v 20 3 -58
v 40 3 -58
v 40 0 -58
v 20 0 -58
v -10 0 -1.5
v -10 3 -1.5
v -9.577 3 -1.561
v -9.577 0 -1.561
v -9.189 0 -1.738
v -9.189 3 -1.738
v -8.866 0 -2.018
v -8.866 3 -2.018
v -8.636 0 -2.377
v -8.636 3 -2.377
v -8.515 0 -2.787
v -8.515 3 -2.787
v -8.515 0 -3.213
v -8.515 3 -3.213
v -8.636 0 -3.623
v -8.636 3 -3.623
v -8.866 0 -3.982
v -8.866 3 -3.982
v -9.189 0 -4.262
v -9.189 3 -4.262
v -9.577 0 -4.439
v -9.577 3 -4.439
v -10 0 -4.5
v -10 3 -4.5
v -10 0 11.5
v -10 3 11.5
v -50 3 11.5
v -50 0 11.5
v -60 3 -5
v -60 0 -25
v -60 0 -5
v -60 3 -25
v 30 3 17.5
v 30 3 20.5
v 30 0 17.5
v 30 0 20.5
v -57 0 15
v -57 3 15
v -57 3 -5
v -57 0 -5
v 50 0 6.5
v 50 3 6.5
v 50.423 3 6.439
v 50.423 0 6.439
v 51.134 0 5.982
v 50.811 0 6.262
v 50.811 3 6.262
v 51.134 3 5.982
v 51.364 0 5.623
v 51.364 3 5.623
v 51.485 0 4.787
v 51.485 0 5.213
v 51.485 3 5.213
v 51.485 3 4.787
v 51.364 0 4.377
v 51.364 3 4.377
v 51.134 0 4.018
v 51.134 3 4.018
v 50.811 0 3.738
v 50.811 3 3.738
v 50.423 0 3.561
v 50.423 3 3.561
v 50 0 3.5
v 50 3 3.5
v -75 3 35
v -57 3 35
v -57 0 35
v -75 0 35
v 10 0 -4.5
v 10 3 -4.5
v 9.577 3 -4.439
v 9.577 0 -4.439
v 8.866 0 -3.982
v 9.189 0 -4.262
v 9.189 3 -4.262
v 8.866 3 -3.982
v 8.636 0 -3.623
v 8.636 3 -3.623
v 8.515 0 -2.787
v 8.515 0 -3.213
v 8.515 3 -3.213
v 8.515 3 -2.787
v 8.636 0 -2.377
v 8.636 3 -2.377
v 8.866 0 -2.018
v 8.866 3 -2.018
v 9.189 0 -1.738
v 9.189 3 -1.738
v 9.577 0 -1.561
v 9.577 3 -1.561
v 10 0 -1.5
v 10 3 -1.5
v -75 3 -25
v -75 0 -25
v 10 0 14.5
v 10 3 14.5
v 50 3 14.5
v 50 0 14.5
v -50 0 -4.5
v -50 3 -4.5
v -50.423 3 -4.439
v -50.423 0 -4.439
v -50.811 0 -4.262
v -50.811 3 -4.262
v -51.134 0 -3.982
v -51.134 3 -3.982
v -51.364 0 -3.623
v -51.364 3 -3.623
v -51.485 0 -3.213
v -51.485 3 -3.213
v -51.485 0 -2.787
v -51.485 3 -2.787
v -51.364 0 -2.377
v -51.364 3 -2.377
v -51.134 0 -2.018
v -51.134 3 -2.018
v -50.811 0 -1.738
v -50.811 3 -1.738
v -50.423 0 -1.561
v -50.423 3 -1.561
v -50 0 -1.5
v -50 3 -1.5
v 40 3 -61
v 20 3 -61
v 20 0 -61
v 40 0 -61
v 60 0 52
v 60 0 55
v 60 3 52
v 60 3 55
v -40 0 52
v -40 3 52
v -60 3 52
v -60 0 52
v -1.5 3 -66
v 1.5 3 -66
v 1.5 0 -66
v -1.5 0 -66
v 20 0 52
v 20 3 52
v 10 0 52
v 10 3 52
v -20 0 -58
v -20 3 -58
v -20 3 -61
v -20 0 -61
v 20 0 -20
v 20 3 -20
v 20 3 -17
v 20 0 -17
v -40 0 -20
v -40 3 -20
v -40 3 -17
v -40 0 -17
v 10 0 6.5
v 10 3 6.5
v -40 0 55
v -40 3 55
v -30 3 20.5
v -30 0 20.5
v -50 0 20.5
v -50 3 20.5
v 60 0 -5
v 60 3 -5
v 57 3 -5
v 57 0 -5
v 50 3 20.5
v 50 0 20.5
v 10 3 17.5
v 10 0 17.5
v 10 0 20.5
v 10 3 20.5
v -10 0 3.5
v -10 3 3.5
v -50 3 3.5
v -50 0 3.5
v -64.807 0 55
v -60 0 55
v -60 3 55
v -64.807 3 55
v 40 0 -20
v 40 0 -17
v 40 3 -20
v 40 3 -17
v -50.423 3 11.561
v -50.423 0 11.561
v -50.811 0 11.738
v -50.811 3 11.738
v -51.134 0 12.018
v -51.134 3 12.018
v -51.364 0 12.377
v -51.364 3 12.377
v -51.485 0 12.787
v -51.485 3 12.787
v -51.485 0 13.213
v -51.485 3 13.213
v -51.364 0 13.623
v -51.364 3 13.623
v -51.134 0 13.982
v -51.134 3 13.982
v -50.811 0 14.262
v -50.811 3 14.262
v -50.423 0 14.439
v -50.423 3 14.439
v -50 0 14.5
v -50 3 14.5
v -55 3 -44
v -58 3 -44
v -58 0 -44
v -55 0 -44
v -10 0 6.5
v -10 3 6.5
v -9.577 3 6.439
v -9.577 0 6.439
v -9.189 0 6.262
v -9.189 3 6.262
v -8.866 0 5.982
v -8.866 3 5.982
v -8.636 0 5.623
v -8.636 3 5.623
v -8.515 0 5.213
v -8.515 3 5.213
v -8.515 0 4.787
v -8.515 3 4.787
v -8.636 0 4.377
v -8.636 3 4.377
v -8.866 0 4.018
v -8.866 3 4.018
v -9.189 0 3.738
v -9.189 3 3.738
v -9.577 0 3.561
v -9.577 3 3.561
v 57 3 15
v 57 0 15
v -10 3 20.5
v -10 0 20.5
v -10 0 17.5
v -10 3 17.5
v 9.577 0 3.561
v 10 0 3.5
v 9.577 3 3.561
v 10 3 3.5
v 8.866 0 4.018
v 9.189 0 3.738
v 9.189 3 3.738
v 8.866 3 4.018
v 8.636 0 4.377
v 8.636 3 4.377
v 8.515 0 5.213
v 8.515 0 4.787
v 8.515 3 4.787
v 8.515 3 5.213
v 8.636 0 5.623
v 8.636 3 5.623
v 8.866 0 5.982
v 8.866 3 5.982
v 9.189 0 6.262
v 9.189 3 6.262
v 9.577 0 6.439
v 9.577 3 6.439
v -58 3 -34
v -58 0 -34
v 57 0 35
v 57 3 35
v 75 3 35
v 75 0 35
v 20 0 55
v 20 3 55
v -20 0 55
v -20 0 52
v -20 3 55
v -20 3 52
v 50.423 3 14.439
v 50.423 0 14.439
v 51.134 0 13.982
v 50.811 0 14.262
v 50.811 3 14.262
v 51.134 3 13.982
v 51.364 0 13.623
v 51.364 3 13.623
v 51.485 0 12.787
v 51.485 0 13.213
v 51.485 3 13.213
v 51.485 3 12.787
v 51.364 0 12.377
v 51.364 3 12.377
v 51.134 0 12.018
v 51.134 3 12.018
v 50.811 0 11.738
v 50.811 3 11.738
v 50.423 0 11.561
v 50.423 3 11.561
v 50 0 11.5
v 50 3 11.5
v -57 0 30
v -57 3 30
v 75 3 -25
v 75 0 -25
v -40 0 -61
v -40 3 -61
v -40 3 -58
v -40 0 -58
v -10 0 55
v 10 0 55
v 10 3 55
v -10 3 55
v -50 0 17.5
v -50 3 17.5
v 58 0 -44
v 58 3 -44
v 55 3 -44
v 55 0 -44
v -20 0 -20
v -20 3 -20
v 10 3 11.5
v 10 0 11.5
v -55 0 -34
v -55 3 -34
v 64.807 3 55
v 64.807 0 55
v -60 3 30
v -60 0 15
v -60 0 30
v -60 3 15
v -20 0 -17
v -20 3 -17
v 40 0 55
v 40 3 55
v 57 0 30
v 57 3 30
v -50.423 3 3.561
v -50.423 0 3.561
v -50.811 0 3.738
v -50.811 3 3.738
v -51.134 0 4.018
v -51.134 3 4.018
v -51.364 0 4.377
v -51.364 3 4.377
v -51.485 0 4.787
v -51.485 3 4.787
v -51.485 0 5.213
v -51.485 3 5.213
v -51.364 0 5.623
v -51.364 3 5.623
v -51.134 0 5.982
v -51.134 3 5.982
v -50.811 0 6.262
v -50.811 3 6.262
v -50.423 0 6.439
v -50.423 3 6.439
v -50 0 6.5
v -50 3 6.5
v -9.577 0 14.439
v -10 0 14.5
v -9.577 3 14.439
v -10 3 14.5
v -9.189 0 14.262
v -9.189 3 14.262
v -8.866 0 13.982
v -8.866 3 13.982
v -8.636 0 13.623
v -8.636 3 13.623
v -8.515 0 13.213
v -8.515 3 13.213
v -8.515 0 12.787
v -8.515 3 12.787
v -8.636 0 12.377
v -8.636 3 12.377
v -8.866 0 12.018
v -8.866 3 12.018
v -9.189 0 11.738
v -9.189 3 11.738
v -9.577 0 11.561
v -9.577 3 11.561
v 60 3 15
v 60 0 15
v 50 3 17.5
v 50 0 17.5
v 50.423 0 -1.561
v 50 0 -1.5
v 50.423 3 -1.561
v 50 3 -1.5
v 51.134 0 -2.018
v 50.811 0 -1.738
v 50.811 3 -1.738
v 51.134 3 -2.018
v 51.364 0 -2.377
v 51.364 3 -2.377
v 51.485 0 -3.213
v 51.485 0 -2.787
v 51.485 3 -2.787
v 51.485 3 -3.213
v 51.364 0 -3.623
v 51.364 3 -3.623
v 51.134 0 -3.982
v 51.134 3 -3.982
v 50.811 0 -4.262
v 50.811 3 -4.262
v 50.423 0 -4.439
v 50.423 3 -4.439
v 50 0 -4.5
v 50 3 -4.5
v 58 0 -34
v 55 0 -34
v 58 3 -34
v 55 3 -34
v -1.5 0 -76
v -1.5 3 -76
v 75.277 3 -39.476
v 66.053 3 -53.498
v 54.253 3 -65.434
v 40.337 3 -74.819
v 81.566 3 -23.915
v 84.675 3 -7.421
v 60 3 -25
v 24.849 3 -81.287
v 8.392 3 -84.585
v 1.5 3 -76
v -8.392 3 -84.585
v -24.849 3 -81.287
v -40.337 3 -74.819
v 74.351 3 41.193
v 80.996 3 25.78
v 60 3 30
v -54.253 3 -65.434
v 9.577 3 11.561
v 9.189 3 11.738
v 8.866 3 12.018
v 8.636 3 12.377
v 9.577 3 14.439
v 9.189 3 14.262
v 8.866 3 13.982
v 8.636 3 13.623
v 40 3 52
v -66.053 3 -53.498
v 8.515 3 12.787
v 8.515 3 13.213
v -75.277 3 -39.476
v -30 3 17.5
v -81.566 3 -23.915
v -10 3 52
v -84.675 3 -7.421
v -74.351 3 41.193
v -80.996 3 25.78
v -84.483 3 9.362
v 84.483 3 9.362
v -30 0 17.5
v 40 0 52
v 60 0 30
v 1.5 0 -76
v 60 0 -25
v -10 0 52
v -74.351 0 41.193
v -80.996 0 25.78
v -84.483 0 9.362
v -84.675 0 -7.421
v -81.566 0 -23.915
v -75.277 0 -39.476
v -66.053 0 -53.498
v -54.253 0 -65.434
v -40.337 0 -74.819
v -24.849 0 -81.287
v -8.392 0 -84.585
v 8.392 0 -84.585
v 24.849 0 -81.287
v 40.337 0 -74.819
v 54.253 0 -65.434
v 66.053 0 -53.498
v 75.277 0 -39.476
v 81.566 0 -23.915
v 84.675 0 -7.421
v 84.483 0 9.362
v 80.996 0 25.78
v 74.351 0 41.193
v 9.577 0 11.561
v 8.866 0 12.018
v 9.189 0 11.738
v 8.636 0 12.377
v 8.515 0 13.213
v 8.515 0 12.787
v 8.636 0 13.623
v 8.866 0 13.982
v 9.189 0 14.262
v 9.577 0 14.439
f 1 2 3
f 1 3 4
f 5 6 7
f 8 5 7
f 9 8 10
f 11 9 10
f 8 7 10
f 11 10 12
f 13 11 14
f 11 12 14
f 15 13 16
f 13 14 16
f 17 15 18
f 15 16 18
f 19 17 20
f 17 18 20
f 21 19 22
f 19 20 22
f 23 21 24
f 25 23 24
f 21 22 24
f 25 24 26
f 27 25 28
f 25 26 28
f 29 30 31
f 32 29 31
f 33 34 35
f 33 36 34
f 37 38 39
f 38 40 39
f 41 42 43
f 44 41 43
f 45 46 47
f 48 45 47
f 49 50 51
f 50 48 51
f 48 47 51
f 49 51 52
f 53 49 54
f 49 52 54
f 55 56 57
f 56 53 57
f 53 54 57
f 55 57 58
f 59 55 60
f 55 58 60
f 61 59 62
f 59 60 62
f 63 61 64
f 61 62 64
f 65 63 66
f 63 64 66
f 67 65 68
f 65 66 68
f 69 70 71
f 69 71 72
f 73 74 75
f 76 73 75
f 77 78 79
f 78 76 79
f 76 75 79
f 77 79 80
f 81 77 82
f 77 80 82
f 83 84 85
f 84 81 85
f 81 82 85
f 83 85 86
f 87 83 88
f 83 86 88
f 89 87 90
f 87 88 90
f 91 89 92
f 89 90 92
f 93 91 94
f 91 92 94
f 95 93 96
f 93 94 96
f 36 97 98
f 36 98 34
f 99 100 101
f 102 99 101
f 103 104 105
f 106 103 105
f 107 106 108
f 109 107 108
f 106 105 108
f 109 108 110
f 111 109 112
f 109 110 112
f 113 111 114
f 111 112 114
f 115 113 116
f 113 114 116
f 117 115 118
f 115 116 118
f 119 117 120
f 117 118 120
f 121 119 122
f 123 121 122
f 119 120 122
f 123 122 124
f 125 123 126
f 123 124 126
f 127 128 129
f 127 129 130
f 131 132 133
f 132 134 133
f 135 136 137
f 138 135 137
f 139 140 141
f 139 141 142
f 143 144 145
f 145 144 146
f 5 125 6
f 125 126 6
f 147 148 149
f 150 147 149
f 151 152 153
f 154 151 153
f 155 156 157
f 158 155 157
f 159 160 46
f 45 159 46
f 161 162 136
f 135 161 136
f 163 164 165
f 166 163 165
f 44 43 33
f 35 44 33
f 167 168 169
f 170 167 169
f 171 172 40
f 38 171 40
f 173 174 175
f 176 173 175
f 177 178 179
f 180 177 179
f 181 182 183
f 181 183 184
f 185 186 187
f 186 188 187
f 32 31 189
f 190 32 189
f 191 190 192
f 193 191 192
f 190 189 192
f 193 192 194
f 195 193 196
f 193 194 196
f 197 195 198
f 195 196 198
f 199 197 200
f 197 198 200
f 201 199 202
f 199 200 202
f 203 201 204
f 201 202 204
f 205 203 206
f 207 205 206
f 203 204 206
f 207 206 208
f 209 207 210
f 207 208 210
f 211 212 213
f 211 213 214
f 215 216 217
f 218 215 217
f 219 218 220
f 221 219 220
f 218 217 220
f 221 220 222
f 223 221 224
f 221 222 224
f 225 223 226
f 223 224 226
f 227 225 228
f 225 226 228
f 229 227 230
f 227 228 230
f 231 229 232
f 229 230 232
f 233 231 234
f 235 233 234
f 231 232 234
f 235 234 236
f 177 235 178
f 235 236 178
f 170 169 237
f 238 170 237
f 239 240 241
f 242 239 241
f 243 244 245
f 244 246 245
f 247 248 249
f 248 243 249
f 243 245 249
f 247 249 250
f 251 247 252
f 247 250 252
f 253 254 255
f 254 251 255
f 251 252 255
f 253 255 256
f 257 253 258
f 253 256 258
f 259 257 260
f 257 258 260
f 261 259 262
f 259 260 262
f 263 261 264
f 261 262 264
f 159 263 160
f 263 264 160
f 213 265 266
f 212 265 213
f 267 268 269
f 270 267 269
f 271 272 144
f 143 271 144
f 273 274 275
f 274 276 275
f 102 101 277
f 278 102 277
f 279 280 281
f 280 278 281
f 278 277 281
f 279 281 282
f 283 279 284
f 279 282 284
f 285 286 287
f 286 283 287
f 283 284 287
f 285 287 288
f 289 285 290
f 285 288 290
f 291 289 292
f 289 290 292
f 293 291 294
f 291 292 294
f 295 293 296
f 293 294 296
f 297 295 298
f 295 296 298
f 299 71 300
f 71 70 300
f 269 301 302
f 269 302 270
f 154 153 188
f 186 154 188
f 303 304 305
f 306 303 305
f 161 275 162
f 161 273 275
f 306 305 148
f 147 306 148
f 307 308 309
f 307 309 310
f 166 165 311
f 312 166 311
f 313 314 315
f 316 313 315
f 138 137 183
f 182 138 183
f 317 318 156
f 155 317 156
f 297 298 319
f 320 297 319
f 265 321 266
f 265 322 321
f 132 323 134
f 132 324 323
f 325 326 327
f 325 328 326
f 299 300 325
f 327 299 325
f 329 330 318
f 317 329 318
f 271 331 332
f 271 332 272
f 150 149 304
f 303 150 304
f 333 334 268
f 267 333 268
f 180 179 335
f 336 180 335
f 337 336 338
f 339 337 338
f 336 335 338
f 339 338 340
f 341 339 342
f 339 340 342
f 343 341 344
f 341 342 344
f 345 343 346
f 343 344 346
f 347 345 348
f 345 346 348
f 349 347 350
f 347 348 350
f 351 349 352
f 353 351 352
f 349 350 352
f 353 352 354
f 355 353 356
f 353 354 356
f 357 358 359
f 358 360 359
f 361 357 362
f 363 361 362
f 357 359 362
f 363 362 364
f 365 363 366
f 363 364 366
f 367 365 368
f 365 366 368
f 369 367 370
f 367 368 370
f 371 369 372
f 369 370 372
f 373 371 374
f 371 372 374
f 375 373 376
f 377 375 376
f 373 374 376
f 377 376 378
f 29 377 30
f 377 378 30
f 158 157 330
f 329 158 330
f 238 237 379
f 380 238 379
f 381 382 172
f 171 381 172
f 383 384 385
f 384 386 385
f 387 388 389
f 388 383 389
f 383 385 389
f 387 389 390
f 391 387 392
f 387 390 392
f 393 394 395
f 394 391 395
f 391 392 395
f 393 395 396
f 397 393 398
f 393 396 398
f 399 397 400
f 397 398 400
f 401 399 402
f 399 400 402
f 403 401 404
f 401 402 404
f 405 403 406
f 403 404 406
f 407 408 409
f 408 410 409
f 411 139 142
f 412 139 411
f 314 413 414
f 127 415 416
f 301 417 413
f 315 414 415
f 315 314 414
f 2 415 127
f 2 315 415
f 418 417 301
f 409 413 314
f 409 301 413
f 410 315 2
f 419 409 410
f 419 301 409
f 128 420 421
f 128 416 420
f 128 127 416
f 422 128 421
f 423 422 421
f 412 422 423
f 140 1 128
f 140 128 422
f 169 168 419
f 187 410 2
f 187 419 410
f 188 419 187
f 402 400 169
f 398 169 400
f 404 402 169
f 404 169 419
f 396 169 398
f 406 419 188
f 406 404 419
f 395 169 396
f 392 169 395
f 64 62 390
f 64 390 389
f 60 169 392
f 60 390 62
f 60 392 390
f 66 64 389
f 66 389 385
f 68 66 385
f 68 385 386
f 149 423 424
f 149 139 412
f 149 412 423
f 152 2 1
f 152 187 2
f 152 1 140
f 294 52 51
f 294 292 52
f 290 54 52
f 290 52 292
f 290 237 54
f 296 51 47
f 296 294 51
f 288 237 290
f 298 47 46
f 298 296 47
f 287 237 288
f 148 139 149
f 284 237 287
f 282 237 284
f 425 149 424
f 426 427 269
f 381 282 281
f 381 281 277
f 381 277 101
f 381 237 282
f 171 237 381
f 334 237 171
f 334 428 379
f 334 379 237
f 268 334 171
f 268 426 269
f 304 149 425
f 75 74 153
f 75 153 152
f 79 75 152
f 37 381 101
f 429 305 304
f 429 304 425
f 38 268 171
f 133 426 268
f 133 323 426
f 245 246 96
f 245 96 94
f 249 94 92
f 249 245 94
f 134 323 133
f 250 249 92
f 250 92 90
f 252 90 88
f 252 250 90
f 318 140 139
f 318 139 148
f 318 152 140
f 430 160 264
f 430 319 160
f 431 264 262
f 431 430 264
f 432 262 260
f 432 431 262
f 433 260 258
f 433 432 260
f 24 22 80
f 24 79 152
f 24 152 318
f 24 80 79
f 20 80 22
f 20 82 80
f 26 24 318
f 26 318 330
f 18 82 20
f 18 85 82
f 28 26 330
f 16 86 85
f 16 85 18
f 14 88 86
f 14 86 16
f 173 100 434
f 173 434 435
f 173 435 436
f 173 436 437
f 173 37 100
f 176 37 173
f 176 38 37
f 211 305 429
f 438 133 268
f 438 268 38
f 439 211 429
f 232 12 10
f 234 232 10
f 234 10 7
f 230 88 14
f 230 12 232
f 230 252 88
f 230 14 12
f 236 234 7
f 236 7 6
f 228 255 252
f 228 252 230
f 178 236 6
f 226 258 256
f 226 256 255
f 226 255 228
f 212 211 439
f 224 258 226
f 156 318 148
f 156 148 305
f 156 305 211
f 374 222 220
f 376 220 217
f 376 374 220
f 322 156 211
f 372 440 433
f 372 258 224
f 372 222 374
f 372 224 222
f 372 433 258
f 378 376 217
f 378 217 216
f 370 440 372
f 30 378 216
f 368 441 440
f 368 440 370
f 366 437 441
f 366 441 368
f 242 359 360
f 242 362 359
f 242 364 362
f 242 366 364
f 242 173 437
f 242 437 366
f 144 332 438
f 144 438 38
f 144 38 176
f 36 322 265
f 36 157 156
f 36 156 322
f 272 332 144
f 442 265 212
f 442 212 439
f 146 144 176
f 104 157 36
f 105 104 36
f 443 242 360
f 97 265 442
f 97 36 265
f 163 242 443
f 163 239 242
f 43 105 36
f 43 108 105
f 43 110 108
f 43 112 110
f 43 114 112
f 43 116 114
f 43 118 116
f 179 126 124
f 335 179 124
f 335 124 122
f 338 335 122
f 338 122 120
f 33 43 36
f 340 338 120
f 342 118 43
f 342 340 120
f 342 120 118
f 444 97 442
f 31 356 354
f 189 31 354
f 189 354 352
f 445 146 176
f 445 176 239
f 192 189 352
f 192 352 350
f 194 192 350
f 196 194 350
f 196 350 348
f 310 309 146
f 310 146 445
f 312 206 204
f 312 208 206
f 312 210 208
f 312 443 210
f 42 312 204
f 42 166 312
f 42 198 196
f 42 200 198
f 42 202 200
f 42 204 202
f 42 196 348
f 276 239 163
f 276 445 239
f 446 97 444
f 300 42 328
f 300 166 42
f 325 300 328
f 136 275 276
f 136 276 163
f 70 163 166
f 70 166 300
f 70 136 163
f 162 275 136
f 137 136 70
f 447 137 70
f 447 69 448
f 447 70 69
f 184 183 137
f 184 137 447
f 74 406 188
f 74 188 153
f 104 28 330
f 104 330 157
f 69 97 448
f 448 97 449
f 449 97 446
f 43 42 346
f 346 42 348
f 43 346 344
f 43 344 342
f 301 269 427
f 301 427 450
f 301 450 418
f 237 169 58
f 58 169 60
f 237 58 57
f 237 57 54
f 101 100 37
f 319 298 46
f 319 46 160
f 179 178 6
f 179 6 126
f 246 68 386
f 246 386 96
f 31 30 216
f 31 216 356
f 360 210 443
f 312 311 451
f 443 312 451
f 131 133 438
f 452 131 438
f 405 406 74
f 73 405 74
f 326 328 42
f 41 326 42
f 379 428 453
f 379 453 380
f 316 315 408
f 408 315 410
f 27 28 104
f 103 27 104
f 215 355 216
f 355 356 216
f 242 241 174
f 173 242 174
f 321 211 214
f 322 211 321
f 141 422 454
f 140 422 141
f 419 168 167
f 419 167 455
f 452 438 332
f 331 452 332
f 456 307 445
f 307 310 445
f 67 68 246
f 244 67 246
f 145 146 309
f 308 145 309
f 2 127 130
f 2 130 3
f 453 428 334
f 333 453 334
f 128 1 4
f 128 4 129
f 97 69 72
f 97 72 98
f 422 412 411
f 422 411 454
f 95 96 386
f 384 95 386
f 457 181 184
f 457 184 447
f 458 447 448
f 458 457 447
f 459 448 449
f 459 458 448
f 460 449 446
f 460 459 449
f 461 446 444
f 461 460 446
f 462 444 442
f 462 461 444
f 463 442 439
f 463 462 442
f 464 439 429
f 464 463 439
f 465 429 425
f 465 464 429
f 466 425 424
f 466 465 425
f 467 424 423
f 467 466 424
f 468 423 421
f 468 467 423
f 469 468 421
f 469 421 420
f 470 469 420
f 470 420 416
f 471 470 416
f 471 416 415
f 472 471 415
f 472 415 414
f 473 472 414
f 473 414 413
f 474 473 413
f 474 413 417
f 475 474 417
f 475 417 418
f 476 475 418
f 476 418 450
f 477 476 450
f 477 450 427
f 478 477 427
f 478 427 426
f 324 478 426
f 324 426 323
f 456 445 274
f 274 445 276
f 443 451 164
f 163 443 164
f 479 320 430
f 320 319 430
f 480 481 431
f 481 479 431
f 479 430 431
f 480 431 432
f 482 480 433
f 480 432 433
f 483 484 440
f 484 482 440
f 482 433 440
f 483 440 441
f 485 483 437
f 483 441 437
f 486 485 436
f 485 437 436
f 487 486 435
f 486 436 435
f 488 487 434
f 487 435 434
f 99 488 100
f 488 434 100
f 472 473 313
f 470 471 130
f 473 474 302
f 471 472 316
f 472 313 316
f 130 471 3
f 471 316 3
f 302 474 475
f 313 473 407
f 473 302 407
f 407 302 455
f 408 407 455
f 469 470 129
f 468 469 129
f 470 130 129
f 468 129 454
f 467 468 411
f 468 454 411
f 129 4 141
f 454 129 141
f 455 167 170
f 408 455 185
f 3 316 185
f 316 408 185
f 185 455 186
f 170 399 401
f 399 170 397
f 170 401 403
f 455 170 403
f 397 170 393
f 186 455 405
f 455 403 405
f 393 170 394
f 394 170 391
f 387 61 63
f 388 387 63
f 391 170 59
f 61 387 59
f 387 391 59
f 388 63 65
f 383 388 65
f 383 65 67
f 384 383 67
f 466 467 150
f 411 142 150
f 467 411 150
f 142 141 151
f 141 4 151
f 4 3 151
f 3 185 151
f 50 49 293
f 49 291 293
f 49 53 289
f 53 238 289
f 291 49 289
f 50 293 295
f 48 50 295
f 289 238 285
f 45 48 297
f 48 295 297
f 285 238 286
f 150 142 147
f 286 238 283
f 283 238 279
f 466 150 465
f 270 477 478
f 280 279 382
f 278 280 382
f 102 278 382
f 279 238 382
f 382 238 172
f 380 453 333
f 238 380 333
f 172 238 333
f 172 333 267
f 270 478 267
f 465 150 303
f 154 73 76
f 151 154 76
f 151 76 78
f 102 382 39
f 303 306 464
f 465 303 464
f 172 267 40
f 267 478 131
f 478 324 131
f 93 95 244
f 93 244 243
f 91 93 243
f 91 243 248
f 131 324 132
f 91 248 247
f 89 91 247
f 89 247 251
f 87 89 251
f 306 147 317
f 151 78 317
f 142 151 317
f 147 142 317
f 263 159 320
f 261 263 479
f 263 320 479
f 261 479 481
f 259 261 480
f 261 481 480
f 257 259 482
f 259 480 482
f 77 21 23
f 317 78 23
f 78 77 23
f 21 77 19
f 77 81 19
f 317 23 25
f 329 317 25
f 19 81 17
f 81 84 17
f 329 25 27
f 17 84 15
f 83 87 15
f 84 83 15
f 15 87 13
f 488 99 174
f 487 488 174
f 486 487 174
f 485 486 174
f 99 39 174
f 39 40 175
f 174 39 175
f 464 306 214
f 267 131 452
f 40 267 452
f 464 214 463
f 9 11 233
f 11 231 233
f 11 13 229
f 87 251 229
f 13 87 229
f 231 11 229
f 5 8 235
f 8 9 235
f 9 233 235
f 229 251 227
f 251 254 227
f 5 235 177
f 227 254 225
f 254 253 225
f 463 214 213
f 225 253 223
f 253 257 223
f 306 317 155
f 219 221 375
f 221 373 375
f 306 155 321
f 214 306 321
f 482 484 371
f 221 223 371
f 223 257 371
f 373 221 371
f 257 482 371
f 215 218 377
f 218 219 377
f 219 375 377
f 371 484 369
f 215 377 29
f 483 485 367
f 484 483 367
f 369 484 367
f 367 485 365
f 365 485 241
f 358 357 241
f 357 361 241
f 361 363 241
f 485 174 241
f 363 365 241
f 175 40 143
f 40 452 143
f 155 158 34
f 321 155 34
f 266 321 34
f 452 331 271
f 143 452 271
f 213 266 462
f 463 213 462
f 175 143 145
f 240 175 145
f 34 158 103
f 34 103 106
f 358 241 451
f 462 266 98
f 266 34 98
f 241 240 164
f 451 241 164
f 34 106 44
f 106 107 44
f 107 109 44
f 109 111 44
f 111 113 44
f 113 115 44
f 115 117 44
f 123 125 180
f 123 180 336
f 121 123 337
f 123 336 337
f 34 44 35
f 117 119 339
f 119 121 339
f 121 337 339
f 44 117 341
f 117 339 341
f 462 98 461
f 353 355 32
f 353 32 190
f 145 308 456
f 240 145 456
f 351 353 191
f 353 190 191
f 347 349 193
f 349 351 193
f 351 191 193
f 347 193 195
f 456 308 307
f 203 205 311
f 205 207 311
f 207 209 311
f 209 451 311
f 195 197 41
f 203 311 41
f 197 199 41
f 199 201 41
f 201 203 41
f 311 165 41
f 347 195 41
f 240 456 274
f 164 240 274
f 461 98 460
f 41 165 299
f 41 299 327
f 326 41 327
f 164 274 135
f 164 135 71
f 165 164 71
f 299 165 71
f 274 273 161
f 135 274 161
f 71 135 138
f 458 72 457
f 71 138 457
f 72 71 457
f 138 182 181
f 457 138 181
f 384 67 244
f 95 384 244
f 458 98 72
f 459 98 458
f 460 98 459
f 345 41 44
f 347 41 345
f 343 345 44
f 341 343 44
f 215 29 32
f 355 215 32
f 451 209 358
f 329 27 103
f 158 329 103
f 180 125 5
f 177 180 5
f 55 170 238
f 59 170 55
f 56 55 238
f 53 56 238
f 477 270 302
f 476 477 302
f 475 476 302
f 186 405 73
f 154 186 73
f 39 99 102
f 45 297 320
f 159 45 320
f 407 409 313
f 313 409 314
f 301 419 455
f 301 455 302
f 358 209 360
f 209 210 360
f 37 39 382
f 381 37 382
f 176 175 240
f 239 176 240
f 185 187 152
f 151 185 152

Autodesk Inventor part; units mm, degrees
ref_plane "YZ Plane" through (0, 0, 0) normal (1, 0, 0) x (0, 1, 0)
ref_plane "XZ Plane" through (0, 0, 0) normal (0, 1, 0) x (-1, 0, 0)
ref_plane "XY Plane" through (0, 0, 0) normal (0, 0, 1) x (1, 0, 0)
sketch "Sketch1" plane through (0, 0, 0) normal (0, 1, 0) x (-1, 0, 0)
  circle A0 centre (0, 0) radius 85
  line L0 (-64.8074, 55) -> (64.8074, 55)
  dimension "d0" = 170
  dimension "d1" = 55
extrude "Extrusion1" add sketch "Sketch1" along normal blind 3 contours A0 L0 picked at (-1.5877, 8.3779)
sketch "Sketch2" plane through (0, 3, 0) normal (0, 1, 0) x (1, 0, 0)
  line L0 (-75, 25) -> (-60, 25)
  line L1 (-60, 25) -> (-60, -35)
  line L2 (-60, -35) -> (-75, -35)
  line L3 (-75, -35) -> (-75, 25)
  line L4 (-75, -5) -> (-60, -5) construction
  point P0 (0, 0)
  dimension "d4" = 15
  dimension "d5" = 60
  dimension "d6" = 60
  dimension "d7" = 5
extrude "Extrusion2" cut sketch "Sketch2" against normal blind 3
sketch "Sketch3" plane through (0, 3, 0) normal (0, 1, 0) x (1, 0, 0)
  line L0 (-60, -35) -> (-60, 25) projected
  line L1 (-60, -15) -> (-57, -15)
  line L2 (-57, -15) -> (-57, 5)
  line L3 (-57, 5) -> (-60, 5)
  line L4 (-60, 5) -> (-60, -15)
  line L5 (-60, -35) -> (-57, -35)
  line L6 (-57, -35) -> (-57, -30)
  line L7 (-57, -30) -> (-60, -30)
  line L8 (-60, -30) -> (-60, -35)
  point P0 (0, 0)
  point P1 (-57, -5)
  point P2 (-60, -5)
  dimension "d10" = 3
  dimension "d11" = 20
  dimension "d12" = 3
  dimension "d13" = 5
  dimension "d14" = 15
extrude "Extrusion3" cut sketch "Sketch3" against normal blind 3
sketch "Sketch8" plane through (0, 3, 0) normal (0, 1, 0) x (1, 0, 0)
  line L0 (-10, -13) -> (-50, -13) construction
  line L1 (-10, -11.5) -> (-50, -11.5)
  line L2 (-50, -14.5) -> (-10, -14.5)
  arc A0 (-10, -14.5) -> (-10, -11.5) centre (-10, -13) ccw
  arc A1 (-50, -11.5) -> (-50, -14.5) centre (-50, -13) ccw
  line L3 (-10, -5) -> (-50, -5) construction
  line L4 (-10, -3.5) -> (-50, -3.5)
  line L5 (-50, -6.5) -> (-10, -6.5)
  arc A2 (-10, -6.5) -> (-10, -3.5) centre (-10, -5) ccw
  arc A3 (-50, -3.5) -> (-50, -6.5) centre (-50, -5) ccw
  line L6 (-10, 3) -> (-50, 3) construction
  line L7 (-10, 4.5) -> (-50, 4.5)
  line L8 (-50, 1.5) -> (-10, 1.5)
  arc A4 (-10, 1.5) -> (-10, 4.5) centre (-10, 3) ccw
  arc A5 (-50, 4.5) -> (-50, 1.5) centre (-50, 3) ccw
  point P0 (0, 0)
  point P1 (-30, -13)
  point P2 (-30, -5)
  point P3 (-30, 3)
  dimension "d54" = 3
  dimension "d55" = 3
  dimension "d56" = 3
  dimension "d57" = 5
  dimension "d58" = 5
  dimension "d59" = 5
  dimension "d60" = 40
  dimension "d61" = 30
extrude "Extrusion7" cut sketch "Sketch8" against normal blind 3
sketch "Sketch4" plane through (0, 3, 0) normal (0, 1, 0) x (1, 0, 0)
  line L0 (-60, -55) -> (-40, -55)
  line L1 (-40, -55) -> (-40, -52)
  line L2 (-40, -52) -> (-60, -52)
  line L3 (-60, -52) -> (-60, -55)
  line L4 (-64.8074, -55) -> (64.8074, -55) projected
  line L5 (-20, -55) -> (-10, -55)
  line L6 (-10, -55) -> (-10, -52)
  line L7 (-10, -52) -> (-20, -52)
  line L8 (-20, -52) -> (-20, -55)
  point P0 (0, 0)
  dimension "d17" = 20
  dimension "d18" = 3
  dimension "d19" = 10
  dimension "d20" = 3
  dimension "d21" = 10
  dimension "d22" = 20
extrude "Extrusion4" cut sketch "Sketch4" against normal blind 3
sketch "Sketch5" plane through (0, 0, 0) normal (0, -1, 0) x (1, 0, 0)
  line L0 (-50, 17.5) -> (-30, 17.5)
  line L1 (-30, 17.5) -> (-30, 20.5)
  line L2 (-30, 20.5) -> (-50, 20.5)
  line L3 (-50, 20.5) -> (-50, 17.5)
  line L4 (-10, 17.5) -> (10, 17.5)
  line L5 (10, 17.5) -> (10, 20.5)
  line L6 (10, 20.5) -> (-10, 20.5)
  line L7 (-10, 20.5) -> (-10, 17.5)
  line L8 (30, 17.5) -> (50, 17.5)
  line L9 (50, 17.5) -> (50, 20.5)
  line L10 (50, 20.5) -> (30, 20.5)
  line L11 (30, 20.5) -> (30, 17.5)
  point P0 (0, 0)
  dimension "d25" = 17.5
  dimension "d26" = 3
  dimension "d27" = 30
  dimension "d28" = 20
  dimension "d31" = 40
extrude "Extrusion5" cut sketch "Sketch5" against normal blind 3
sketch "Sketch6" plane through (0, 3, 0) normal (0, 1, 0) x (1, 0, 0)
  point P0 (0, 0)
sketch "Sketch7" plane through (0, 3, 0) normal (0, 1, 0) x (1, 0, 0)
  line L0 (55, 20) -> (-55, 20) construction
  line L1 (-55, 20) -> (-55, 58) construction
  line L2 (-55, 58) -> (55, 58) construction
  line L3 (55, 58) -> (55, 20) construction
  line L4 (40, 58) -> (20, 58)
  line L5 (20, 58) -> (20, 61)
  line L6 (20, 61) -> (40, 61)
  line L7 (40, 61) -> (40, 58)
  line L8 (-40, 58) -> (-20, 58)
  line L9 (-20, 58) -> (-20, 61)
  line L10 (-20, 61) -> (-40, 61)
  line L11 (-40, 61) -> (-40, 58)
  line L12 (40, 20) -> (20, 20)
  line L13 (20, 20) -> (20, 17)
  line L14 (20, 17) -> (40, 17)
  line L15 (40, 17) -> (40, 20)
  line L16 (-20, 20) -> (-40, 20)
  line L17 (-40, 20) -> (-40, 17)
  line L18 (-40, 17) -> (-20, 17)
  line L19 (-20, 17) -> (-20, 20)
  line L20 (55, 34) -> (58, 34)
  line L21 (58, 34) -> (58, 44)
  line L22 (58, 44) -> (55, 44)
  line L23 (55, 44) -> (55, 34)
  line L24 (-55, 34) -> (-58, 34)
  line L25 (-58, 34) -> (-58, 44)
  line L26 (-58, 44) -> (-55, 44)
  line L27 (-55, 44) -> (-55, 34)
  point P0 (0, 0)
  point P1 (0, 58)
  point P2 (58, 39)
  point P3 (55, 39)
  dimension "d38" = 110
  dimension "d39" = 38
  dimension "d40" = 20
  dimension "d41" = 20
  dimension "d42" = 3
  dimension "d43" = 20
  dimension "d44" = 3
  dimension "d45" = 20
  dimension "d46" = 40
  dimension "d47" = 3
  dimension "d50" = 3
  dimension "d51" = 10
  dimension "d52" = 3
  dimension "d53" = 10
extrude "Extrusion6" cut sketch "Sketch7" against normal blind 3
mirror "Mirror1" about plane through (0, 0, 0) normal (1, 0, 0) of "Extrusion2", "Extrusion3", "Extrusion4", "Extrusion7"
sketch "Sketch9" plane through (0, 3, 0) normal (0, 1, 0) x (1, 0, 0)
  line L0 (1.5, 66) -> (-1.5, 66)
  line L1 (-1.5, 66) -> (-1.5, 76)
  line L2 (-1.5, 76) -> (1.5, 76)
  line L3 (1.5, 76) -> (1.5, 66)
  line L4 (20, 61) -> (40, 61) projected
  point P0 (0, 0)
  point P1 (0, 66)
  dimension "d64" = 3
  dimension "d65" = 10
  dimension "d66" = 5
extrude "Extrusion8" cut sketch "Sketch9" against normal blind 3
properties part number "BasePlate"
